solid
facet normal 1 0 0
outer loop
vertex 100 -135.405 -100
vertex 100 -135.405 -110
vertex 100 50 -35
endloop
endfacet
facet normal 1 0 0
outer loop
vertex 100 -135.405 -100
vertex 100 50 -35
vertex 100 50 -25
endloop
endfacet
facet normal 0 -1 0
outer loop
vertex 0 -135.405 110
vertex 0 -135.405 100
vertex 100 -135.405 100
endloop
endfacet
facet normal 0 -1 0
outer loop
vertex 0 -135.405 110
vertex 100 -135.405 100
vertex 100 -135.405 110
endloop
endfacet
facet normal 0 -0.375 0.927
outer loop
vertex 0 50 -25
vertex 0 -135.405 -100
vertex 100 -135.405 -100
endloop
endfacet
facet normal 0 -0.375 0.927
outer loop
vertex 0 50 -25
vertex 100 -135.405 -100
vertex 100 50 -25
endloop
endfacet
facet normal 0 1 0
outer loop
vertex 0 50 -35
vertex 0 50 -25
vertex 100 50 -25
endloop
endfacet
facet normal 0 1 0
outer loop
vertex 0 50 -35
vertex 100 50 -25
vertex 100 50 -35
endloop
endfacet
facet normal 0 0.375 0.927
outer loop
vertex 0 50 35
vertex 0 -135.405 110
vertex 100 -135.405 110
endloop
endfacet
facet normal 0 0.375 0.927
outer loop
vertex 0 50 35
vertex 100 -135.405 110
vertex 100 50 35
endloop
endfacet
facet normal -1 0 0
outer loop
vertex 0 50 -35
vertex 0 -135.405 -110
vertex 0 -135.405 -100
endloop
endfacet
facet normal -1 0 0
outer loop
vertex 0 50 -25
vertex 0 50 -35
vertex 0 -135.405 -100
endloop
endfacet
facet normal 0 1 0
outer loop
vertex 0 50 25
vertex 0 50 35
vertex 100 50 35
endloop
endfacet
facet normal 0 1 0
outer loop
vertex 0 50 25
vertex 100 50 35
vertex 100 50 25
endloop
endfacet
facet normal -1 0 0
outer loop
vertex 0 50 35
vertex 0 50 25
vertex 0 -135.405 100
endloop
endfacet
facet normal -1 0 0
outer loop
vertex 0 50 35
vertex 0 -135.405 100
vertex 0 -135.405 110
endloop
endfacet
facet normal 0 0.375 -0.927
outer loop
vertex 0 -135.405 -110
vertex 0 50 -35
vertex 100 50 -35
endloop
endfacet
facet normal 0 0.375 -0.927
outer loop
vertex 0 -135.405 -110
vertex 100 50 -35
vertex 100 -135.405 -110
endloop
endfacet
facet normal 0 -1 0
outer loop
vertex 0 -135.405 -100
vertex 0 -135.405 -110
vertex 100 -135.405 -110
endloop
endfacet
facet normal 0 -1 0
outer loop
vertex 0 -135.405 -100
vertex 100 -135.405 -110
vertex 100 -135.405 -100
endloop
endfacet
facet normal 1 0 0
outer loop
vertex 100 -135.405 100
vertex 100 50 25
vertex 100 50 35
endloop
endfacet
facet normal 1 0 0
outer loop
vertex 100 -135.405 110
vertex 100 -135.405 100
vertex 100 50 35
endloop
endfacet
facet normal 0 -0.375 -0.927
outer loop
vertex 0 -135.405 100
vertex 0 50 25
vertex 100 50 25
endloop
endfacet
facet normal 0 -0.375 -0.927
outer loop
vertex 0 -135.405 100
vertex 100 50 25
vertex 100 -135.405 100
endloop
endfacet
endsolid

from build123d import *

# Parameters (mm, degrees)
BOSS_EXTRUDE1_DEPTH   = 100
BOSS_EXTRUDE1_2_DEPTH = 100


with BuildPart() as part:
    # Sketch1 → Boss-Extrude1 (new body)
    with BuildSketch(Plane(origin=(0, 0, 0), x_dir=(0, 0, -1), z_dir=(1, 0, 0))):
        Polygon((-25, 50), (-100, -135.404962177), (-110, -135.404962177), (-35, 50), align=None)
    extrude(amount=BOSS_EXTRUDE1_DEPTH)


with BuildPart() as body_2:
    # Sketch1 → Boss-Extrude1 2 (new body)
    with BuildSketch(Plane(origin=(0, 0, 0), x_dir=(0, 0, -1), z_dir=(1, 0, 0))):
        Polygon((110, -135.404962177), (100, -135.404962177), (25, 50), (35, 50), align=None)
    extrude(amount=BOSS_EXTRUDE1_2_DEPTH)


solid = Compound([part.part, body_2.part])
